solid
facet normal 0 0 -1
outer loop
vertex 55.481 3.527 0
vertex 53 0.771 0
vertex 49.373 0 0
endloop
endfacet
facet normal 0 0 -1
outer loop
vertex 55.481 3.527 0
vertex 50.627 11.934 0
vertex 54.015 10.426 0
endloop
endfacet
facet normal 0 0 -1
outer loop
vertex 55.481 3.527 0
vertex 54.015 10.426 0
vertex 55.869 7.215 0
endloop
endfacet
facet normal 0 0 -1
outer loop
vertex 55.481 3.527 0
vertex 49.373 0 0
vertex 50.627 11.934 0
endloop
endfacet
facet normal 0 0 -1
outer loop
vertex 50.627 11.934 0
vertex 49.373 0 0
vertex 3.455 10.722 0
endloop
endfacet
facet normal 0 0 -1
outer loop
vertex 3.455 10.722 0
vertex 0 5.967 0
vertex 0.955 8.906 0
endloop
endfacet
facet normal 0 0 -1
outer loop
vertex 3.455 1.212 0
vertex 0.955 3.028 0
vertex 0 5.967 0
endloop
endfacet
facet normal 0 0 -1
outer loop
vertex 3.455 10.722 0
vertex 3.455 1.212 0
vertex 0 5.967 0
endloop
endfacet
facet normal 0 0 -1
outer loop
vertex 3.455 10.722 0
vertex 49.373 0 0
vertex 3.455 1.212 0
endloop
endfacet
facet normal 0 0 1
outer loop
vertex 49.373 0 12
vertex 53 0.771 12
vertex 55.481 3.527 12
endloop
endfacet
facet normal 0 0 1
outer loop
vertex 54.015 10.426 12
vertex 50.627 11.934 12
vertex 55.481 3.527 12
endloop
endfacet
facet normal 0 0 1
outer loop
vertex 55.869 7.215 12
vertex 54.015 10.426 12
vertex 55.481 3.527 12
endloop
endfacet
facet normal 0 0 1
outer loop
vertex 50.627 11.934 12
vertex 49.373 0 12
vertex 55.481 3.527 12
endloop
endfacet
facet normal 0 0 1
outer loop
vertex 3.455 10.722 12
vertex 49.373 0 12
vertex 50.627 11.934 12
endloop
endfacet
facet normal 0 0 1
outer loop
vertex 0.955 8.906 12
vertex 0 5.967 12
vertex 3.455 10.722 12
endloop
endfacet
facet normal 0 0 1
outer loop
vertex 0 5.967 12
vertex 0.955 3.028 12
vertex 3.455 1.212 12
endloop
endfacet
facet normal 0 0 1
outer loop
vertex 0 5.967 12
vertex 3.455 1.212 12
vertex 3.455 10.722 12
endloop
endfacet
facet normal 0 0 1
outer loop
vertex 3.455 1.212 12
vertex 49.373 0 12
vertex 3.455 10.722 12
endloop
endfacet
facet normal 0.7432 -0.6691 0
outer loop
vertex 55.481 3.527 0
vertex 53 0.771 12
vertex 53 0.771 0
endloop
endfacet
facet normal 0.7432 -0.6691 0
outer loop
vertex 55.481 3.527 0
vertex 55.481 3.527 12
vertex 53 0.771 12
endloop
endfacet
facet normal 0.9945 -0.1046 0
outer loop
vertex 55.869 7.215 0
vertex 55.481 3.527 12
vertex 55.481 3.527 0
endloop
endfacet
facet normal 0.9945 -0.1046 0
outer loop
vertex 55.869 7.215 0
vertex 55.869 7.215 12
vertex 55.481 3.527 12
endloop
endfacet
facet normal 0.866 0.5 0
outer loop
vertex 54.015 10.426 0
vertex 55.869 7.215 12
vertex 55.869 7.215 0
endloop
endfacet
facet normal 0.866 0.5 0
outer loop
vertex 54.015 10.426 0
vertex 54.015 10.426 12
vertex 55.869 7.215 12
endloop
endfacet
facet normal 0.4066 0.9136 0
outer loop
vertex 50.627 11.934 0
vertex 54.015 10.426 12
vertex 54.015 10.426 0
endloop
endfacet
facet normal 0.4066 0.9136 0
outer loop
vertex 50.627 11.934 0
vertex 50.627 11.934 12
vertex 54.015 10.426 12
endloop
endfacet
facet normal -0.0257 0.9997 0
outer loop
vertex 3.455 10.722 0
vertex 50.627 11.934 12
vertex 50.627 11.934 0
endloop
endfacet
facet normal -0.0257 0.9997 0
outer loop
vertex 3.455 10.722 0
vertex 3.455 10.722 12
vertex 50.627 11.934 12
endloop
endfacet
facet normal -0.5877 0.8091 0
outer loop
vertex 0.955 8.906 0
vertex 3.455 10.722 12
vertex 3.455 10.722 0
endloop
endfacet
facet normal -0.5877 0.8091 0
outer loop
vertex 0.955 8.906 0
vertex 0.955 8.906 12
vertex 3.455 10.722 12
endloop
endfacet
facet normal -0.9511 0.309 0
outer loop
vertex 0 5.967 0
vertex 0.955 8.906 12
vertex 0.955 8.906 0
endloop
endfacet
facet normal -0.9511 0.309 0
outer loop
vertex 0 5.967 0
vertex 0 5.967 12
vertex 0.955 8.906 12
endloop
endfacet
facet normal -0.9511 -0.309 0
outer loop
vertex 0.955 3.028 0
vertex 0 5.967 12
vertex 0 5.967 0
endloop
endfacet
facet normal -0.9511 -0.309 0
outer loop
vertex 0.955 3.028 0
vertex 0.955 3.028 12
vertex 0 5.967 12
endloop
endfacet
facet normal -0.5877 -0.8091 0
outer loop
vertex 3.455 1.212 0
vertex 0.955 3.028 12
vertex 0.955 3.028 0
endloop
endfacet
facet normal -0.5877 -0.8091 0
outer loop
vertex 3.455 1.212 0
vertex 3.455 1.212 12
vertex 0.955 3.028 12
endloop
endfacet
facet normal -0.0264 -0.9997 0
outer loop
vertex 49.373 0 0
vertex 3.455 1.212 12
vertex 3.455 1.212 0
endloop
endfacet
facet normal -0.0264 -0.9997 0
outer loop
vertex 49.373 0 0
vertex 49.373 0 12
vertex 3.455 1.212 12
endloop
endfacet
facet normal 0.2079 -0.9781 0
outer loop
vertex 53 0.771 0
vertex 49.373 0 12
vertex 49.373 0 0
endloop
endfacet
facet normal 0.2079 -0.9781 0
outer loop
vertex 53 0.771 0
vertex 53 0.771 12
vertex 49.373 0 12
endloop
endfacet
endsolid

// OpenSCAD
$fn = 32;

// ----------------------------------------------------------------------
// Lever arm: two bosses 10 and 12 mm, 45 mm between centres
// ----------------------------------------------------------------------

// --- parameters (mm) ---
profile_height = 12;      // extrusion height
profile_points = 11;      // points of the closed outline

profile = [[0, 5.967], [0.955, 3.028], [3.455, 1.212], [49.373, 0], [53, 0.771], [55.481, 3.527], [55.869, 7.215], [54.015, 10.426], [50.627, 11.934], [3.455, 10.722], [0.955, 8.906]];  // single closed polygon, 11 points, counter clockwise

// --- the one profile operation ---
linear_extrude(height = profile_height) polygon(points = profile);
